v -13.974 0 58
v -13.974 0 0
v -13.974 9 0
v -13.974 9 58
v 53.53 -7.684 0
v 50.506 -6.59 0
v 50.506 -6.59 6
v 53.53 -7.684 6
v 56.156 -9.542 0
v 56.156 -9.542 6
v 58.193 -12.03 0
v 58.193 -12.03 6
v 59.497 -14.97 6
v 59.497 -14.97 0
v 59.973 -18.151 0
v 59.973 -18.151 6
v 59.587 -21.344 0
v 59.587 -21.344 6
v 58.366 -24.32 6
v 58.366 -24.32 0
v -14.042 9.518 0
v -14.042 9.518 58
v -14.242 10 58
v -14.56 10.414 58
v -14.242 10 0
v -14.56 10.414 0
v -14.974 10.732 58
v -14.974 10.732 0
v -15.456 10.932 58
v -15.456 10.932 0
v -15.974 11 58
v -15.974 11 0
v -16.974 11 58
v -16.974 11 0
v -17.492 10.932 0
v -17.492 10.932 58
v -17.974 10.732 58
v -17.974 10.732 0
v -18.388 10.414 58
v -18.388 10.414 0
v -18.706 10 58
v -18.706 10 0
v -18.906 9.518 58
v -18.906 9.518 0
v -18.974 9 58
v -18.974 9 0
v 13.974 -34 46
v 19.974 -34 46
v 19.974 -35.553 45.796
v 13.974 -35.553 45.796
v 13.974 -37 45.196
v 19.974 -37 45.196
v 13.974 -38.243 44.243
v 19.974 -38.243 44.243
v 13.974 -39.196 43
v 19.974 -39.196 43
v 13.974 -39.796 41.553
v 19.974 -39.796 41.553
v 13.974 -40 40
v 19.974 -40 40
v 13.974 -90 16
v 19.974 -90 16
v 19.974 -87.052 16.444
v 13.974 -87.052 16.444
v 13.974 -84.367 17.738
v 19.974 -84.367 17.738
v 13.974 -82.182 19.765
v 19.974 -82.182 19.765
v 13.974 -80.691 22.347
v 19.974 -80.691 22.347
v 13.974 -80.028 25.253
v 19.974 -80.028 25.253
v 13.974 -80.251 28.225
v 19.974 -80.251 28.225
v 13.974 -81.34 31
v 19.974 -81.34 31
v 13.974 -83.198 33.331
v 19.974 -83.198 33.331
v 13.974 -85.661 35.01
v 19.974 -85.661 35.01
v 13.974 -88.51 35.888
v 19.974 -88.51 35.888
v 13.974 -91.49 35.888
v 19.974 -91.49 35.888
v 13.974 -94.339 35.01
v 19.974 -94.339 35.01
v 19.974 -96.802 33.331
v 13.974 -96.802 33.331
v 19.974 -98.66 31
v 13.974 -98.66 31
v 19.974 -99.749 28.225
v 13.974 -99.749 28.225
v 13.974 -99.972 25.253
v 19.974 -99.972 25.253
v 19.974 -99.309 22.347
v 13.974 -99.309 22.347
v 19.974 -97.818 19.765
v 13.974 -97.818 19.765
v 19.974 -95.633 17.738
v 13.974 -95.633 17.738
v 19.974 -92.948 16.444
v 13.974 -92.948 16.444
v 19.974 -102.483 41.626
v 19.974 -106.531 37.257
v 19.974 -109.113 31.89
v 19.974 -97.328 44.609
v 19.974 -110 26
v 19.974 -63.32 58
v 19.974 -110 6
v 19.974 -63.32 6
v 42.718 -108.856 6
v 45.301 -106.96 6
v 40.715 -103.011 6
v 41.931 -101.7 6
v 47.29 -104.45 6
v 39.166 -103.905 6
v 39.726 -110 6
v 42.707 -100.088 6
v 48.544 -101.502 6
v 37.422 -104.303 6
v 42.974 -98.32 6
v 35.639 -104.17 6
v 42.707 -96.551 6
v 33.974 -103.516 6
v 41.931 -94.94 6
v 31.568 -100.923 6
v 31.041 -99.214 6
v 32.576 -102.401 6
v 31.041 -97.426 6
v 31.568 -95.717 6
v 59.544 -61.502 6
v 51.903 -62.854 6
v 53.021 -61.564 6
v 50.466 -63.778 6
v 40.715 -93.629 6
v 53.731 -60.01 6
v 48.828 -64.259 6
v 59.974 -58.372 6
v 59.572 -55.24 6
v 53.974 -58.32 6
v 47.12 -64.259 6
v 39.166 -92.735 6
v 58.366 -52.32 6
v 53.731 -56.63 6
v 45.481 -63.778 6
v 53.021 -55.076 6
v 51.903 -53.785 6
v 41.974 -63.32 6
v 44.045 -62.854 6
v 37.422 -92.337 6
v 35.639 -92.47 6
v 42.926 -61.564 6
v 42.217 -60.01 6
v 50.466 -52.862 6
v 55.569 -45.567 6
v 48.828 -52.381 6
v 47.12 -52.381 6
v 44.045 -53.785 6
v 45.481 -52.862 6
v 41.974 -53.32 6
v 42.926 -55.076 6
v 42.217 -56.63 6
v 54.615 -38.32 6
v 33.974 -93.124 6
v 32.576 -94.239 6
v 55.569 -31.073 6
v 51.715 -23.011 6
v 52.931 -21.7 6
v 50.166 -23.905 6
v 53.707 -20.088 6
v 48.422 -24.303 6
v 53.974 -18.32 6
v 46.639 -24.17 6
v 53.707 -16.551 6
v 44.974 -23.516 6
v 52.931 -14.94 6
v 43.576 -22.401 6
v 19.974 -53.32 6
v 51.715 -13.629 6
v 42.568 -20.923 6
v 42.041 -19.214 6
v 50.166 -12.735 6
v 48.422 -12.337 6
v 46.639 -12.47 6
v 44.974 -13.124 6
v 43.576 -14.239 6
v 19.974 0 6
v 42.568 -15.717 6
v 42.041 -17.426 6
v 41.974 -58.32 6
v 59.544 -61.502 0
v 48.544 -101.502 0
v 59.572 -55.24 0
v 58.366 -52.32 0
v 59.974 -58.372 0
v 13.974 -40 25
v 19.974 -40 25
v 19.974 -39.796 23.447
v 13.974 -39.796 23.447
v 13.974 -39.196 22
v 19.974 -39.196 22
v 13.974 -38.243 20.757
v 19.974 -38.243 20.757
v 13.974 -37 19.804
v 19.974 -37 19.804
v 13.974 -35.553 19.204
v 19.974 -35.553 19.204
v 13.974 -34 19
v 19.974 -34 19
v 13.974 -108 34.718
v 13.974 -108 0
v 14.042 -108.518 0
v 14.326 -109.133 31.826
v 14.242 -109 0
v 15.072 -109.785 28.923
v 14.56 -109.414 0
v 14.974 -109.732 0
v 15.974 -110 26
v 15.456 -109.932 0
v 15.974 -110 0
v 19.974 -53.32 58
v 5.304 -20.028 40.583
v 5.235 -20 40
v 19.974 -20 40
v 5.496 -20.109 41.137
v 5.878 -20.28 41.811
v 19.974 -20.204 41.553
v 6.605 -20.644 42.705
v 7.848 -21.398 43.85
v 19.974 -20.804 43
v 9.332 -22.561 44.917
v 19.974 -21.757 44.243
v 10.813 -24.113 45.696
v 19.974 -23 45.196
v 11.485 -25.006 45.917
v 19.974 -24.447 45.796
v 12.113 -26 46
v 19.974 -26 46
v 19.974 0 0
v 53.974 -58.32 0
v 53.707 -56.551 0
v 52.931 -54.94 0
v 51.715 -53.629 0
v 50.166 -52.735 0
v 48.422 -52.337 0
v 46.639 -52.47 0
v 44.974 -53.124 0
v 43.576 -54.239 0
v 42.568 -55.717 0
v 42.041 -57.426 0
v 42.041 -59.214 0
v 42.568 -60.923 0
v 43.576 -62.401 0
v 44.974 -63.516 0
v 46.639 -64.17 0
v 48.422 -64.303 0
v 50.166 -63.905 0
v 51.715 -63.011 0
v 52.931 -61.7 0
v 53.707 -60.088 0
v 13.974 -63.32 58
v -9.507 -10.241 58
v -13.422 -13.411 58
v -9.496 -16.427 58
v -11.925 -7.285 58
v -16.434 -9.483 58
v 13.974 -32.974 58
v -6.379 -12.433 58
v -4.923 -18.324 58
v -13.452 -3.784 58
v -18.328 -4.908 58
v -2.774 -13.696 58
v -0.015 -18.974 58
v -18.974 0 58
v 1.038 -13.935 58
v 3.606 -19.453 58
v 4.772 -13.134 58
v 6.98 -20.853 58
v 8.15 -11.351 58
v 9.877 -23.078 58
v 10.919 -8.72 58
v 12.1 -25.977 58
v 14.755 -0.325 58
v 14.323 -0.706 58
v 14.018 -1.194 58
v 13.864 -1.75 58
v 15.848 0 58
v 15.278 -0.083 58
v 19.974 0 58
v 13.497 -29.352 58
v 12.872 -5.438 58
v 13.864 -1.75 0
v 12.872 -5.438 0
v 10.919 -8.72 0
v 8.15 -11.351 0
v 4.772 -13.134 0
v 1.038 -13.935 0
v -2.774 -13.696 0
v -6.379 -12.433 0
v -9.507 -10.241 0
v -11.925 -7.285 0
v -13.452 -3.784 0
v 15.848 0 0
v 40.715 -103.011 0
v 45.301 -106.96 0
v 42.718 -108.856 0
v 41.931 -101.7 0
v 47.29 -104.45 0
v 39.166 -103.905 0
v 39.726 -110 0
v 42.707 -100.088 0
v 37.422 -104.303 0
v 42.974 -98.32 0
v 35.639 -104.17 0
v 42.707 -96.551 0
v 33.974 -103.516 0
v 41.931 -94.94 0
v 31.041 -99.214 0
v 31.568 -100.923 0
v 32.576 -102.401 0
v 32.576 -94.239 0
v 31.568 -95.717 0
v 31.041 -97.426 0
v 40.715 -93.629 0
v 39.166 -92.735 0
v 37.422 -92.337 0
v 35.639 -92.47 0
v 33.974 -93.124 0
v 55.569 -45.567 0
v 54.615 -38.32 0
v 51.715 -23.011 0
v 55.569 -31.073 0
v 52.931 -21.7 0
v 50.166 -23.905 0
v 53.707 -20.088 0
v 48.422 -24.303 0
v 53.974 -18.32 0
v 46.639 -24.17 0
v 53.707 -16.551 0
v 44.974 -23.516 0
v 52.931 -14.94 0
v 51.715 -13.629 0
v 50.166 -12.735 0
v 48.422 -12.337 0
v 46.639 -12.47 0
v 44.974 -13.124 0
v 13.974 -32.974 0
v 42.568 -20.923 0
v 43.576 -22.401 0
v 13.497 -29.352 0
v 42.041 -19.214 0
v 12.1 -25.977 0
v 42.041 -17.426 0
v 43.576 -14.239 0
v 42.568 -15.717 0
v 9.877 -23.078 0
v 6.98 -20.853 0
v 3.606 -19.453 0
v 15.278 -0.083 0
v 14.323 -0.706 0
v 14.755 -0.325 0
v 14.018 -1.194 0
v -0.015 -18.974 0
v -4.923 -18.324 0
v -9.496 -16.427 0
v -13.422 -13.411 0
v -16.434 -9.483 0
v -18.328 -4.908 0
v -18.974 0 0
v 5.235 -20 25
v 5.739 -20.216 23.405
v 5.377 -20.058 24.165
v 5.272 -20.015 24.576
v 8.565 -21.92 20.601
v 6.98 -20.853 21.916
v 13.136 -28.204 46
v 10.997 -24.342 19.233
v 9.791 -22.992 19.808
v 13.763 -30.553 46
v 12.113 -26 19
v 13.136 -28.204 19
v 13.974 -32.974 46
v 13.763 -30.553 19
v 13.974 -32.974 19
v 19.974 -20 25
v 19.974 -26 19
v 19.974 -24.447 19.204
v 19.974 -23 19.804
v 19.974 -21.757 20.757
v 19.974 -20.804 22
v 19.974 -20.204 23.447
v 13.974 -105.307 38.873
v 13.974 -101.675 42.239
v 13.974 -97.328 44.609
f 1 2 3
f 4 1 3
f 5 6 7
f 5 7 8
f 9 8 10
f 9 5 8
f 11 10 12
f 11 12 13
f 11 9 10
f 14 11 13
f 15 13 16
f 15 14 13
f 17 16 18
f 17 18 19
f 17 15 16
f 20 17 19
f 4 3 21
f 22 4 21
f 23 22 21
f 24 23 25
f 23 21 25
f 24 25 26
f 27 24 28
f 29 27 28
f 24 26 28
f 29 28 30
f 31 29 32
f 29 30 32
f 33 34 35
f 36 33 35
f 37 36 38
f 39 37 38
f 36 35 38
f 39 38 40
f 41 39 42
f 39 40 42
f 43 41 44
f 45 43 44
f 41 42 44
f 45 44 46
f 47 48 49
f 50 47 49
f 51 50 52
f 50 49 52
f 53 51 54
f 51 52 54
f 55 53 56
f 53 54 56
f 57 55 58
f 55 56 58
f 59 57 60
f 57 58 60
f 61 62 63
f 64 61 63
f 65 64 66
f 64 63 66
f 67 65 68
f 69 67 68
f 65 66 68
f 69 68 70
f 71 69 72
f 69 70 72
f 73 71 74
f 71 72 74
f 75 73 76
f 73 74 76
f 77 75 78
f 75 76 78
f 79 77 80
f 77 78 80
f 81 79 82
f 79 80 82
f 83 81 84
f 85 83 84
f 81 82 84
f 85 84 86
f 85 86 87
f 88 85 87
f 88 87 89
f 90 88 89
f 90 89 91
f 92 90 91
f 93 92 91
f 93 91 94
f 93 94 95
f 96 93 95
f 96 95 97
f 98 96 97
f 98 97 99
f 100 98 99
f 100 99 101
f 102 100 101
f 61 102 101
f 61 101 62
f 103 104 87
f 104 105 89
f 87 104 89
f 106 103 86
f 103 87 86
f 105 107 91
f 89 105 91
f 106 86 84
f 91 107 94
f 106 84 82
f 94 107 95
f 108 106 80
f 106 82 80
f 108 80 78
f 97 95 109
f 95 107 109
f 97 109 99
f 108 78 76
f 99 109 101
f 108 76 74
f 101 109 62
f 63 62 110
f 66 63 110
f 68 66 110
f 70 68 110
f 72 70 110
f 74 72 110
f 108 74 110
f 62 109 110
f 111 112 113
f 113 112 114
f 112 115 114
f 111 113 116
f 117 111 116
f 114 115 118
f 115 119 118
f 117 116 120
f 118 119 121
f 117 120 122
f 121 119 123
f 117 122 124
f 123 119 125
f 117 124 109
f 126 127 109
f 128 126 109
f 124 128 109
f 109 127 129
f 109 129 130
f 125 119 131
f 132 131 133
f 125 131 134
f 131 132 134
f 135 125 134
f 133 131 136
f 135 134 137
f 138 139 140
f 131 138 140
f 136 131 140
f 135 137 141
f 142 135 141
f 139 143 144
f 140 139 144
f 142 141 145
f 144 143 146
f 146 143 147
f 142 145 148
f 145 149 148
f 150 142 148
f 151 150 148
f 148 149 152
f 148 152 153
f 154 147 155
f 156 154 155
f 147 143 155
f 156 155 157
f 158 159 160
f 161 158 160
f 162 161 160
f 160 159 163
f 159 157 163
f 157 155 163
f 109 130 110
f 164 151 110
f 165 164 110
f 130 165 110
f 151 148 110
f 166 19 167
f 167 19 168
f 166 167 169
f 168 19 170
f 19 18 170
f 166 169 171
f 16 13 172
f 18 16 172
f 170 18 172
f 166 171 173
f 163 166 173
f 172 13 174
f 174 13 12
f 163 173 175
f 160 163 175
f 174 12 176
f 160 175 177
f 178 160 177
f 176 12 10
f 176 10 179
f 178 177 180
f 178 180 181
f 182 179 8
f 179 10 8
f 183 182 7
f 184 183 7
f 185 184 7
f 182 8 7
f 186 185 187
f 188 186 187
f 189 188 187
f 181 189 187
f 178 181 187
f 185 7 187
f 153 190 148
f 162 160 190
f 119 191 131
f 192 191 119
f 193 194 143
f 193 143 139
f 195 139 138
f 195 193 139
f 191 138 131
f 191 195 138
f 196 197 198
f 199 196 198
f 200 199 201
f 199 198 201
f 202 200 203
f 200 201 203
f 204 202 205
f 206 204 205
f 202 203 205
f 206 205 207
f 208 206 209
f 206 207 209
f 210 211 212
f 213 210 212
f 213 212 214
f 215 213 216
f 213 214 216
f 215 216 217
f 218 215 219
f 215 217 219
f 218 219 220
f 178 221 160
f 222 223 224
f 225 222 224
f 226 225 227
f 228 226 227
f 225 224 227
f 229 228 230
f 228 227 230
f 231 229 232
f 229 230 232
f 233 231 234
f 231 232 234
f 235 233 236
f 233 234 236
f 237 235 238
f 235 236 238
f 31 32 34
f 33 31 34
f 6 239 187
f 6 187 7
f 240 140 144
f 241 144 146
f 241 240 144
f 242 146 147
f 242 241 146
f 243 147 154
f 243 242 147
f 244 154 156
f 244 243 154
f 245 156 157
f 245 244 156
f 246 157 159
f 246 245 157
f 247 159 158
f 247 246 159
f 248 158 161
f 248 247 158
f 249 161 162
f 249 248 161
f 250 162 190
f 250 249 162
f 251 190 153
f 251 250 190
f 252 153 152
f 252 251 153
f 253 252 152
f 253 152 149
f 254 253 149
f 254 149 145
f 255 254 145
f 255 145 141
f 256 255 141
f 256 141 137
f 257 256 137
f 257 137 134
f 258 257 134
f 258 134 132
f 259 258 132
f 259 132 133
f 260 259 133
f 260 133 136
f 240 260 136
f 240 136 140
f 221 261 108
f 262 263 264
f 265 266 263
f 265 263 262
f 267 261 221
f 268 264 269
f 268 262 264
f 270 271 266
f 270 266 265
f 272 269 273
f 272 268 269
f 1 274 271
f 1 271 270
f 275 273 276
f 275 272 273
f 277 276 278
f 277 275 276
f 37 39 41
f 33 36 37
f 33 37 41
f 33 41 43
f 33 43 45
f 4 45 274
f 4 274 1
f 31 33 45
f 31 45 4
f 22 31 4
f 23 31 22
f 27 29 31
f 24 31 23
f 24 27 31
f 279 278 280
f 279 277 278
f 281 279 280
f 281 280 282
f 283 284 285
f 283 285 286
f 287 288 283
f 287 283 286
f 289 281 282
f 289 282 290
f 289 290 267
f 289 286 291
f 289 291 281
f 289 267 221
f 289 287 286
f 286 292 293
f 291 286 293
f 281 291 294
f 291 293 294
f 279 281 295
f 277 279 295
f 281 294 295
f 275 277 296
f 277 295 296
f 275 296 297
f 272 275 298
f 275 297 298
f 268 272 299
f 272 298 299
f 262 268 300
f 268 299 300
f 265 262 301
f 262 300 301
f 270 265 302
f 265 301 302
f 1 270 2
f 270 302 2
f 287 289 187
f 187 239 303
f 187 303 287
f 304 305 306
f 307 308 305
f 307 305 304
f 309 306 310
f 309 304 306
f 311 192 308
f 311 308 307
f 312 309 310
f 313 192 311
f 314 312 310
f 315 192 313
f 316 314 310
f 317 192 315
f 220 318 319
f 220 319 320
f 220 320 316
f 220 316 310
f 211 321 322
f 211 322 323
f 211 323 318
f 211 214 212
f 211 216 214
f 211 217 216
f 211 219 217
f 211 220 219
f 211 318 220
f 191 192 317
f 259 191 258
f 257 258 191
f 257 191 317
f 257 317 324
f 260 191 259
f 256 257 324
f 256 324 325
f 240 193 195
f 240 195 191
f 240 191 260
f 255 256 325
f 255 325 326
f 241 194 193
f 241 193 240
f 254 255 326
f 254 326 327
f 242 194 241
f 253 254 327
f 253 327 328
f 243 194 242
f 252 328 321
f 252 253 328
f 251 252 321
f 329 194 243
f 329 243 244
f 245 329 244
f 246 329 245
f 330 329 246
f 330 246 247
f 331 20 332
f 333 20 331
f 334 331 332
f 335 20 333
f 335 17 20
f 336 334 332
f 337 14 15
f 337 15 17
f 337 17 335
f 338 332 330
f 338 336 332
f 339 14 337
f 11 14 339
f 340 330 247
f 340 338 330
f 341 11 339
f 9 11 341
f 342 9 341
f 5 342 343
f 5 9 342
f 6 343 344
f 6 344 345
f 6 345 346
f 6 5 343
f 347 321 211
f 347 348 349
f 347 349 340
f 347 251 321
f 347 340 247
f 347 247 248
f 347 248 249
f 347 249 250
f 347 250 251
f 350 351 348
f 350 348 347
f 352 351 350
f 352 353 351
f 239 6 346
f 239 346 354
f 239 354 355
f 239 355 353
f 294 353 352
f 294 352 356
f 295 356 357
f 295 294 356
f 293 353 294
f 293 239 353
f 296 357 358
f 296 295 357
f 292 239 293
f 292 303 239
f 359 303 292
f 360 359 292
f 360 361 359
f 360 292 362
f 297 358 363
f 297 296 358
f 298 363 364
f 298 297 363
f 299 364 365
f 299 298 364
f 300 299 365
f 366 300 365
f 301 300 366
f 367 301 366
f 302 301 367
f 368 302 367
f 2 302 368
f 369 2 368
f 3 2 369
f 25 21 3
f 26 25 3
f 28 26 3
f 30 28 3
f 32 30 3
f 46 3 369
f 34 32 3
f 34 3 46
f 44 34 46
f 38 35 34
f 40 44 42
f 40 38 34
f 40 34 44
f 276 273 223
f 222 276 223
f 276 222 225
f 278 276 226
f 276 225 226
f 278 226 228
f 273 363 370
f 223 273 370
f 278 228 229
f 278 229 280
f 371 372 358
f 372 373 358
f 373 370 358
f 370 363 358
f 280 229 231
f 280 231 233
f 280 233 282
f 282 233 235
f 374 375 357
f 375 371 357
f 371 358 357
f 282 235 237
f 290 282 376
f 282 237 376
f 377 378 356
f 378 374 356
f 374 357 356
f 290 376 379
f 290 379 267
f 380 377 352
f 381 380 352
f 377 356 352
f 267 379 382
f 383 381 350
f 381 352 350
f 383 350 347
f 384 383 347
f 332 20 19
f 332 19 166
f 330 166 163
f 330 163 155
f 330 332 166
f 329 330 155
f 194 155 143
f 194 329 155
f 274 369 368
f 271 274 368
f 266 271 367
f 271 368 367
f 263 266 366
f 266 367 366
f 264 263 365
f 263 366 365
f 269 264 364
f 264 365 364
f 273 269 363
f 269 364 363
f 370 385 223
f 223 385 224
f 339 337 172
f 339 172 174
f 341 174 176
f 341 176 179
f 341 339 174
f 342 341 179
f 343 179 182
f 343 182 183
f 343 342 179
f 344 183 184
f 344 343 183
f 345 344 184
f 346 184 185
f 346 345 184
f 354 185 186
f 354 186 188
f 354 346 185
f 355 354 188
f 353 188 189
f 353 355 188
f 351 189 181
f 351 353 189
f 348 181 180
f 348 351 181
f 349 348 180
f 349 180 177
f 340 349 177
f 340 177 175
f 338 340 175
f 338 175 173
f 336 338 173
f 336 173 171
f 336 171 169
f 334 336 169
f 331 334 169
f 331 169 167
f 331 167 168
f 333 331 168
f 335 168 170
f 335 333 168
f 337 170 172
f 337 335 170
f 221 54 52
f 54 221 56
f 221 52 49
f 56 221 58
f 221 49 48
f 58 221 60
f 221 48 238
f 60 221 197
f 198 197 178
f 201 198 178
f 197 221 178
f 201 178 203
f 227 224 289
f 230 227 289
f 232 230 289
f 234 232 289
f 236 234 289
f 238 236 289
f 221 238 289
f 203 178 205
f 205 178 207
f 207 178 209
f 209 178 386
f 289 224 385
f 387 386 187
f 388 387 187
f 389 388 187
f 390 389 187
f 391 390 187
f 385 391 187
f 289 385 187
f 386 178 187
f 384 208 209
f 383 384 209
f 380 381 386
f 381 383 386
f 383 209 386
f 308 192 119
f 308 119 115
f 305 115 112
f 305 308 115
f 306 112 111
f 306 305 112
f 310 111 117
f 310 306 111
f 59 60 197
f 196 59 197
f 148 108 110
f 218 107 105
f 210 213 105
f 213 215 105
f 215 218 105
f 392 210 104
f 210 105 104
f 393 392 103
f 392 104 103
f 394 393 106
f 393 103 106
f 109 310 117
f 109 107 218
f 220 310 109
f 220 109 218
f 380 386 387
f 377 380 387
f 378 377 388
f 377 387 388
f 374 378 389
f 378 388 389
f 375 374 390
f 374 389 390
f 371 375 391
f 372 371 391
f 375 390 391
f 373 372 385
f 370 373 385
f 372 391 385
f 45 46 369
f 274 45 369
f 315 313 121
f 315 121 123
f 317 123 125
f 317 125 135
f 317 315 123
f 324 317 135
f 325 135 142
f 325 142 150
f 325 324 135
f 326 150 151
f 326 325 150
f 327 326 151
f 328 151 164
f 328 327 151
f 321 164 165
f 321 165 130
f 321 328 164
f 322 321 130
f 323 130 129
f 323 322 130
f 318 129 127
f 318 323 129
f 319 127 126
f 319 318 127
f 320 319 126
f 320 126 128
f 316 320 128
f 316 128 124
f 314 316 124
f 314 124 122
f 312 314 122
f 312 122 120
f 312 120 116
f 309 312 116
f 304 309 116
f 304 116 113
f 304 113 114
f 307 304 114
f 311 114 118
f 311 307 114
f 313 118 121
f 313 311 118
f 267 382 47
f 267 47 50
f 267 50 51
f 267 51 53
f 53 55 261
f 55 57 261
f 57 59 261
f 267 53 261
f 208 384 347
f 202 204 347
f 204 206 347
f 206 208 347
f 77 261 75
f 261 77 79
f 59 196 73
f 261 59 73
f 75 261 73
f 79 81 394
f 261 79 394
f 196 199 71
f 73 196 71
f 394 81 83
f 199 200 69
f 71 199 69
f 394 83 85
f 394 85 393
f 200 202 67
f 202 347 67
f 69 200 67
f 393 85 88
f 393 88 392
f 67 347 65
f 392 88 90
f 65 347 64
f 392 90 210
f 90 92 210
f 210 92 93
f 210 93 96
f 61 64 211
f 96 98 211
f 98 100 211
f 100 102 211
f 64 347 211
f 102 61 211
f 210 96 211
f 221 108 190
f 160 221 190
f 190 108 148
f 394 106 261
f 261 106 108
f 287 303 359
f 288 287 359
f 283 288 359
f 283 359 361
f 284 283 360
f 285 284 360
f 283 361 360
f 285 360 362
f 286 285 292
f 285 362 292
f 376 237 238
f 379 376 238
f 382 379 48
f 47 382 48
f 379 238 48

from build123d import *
from OCP.BRepAlgoAPI import BRepAlgoAPI_Cut
from OCP.TopTools import TopTools_ListOfShape

# Parameters (mm, degrees)
BOSS_EXTRUDE1_DEPTH = 58
SKETCH1_4_R         = 6
BOSS_EXTRUDE3_DEPTH = 6
CUT_EXTRUDE8_DEPTH  = 26
RIB14_REACH         = 110.472
SKETCH8_WALL_W      = 275.405915094
SKETCH8_WALL_H      = 10
SKETCH10_R          = 10
CUT_EXTRUDE10_DEPTH = 21


with BuildPart() as part:
    # Sketch1 → Boss-Extrude1 (new body)
    with BuildSketch(Plane.XY):
        with BuildLine():
            Line((-18.973896199, 9), (-18.973896199, 0))
            ThreePointArc((-18.973896199, 0), (-13.421880234, -13.411258999), (-0.015020694, -18.973890253))
            ThreePointArc((-0.015020694, -18.973890253), (9.87730883, -23.078310175), (13.973896199, -32.973885866))
            Line((13.973896199, -32.973885866), (13.973896199, -108))
            ThreePointArc((13.973896199, -108), (14.559682636, -109.414213562), (15.973896199, -110))
            Line((15.973896199, -110), (19.973896199, -110))
            Line((19.973896199, -110), (19.973896199, 0))
            Line((19.973896199, 0), (15.848197366, 0))
            ThreePointArc((15.848197366, 0), (14.525476133, -0.499863827), (13.863935397, -1.749591462))
            ThreePointArc((13.863935397, -1.749591462), (-0.876521771, -13.946378905), (-13.973896199, 0))
            Line((-13.973896199, 0), (-13.973896199, 9))
            ThreePointArc((-13.973896199, 9), (-14.559682636, 10.414213562), (-15.973896199, 11))
            Line((-15.973896199, 11), (-16.973896199, 11))
            ThreePointArc((-16.973896199, 11), (-18.388109761, 10.414213562), (-18.973896199, 9))
        make_face()
    extrude(amount=BOSS_EXTRUDE1_DEPTH)

    # Sketch1<4> → Boss-Extrude3 (add)
    with BuildSketch(Plane.XY):
        with BuildLine():
            Line((19.973896199, 0), (19.973896199, -110))
            Line((19.973896199, -110), (39.726458462, -110))
            ThreePointArc((39.726458462, -110), (45.301079262, -106.960444534), (48.544360912, -101.501834946))
            Line((48.544360912, -101.501834946), (59.544360912, -61.501834946))
            ThreePointArc((59.544360912, -61.501834946), (59.876313249, -56.792715074), (58.366201044, -52.31995715))
            ThreePointArc((58.366201044, -52.31995715), (54.61491235, -38.31995715), (58.366201044, -24.31995715))
            ThreePointArc((58.366201044, -24.31995715), (58.944097052, -13.456348075), (50.505709466, -6.590084108))
            Line((50.505709466, -6.590084108), (19.973896199, 0))
        make_face()
        with Locations((36.973896199, -98.31995715)):
            Circle(SKETCH1_4_R, mode=Mode.SUBTRACT)
        with Locations((47.973896199, -58.31995715)):
            Circle(SKETCH1_4_R, mode=Mode.SUBTRACT)
        with Locations((47.973896199, -18.31995715)):
            Circle(SKETCH1_4_R, mode=Mode.SUBTRACT)
    extrude(amount=BOSS_EXTRUDE3_DEPTH)

    # Sketch6 → Cut-Extrude8 (cut)
    with BuildSketch(Plane(origin=(19.973896199, 0, 0), x_dir=(0, 0, -1), z_dir=(1, 0, 0))):
        with BuildLine():
            Line((-40, -40), (-25, -40))
            ThreePointArc((-25, -40), (-20.757359313, -38.242640687), (-19, -34))
            Line((-19, -34), (-19, -26))
            ThreePointArc((-19, -26), (-20.757359313, -21.757359313), (-25, -20))
            Line((-25, -20), (-40, -20))
            ThreePointArc((-40, -20), (-44.242640687, -21.757359313), (-46, -26))
            Line((-46, -26), (-46, -34))
            ThreePointArc((-46, -34), (-44.242640687, -38.242640687), (-40, -40))
        make_face()
    extrude(amount=-CUT_EXTRUDE8_DEPTH, mode=Mode.SUBTRACT)

    # Sketch8 wall → Rib14 (add, up to next)
    with BuildSketch(Plane(origin=(30.973896199, -58.31995715, 32), x_dir=(0.389639990837, 0, -0.920967251069), z_dir=(-0.920967251069, 0, -0.389639990837)), mode=Mode.PRIVATE) as rib14_sk1:
        Rectangle(SKETCH8_WALL_W, SKETCH8_WALL_H)
    rib14_tool1 = extrude(rib14_sk1.sketch, amount=RIB14_REACH, mode=Mode.PRIVATE) - part.part
    add(rib14_tool1.solids().sort_by_distance((30.973896199, -58.31995715, 32))[0])


with BuildPart() as cut_extrude10_tool:
    # Sketch10 → Cut-Extrude10 (new body)
    with BuildSketch(Plane(origin=(19.973896199, 0, 0), x_dir=(0, 0, -1), z_dir=(1, 0, 0))):
        with BuildLine():
            ThreePointArc((-26.000000311, -110), (-37.257208214, -106.531039387), (-44.609335124, -97.327526611))
            Line((-44.609335124, -97.327526611), (-58, -63.31995715))
            Line((-58, -63.31995715), (-58, -110))
            Line((-58, -110), (-26.000000311, -110))
        make_face()
        with Locations((-26, -90)):
            Circle(SKETCH10_R)
    extrude(amount=-CUT_EXTRUDE10_DEPTH)


with BuildPart() as part_1:
    add(part.part)

    # Cut-Extrude10: cut by cut_extrude10_tool, with a tolerance
    cut_extrude10_stock = TopTools_ListOfShape()
    cut_extrude10_stock.Append(part_1.part.wrapped)
    cut_extrude10_tools = TopTools_ListOfShape()
    cut_extrude10_tools.Append(cut_extrude10_tool.part.wrapped)
    cut_extrude10_cut = BRepAlgoAPI_Cut()
    cut_extrude10_cut.SetArguments(cut_extrude10_stock)
    cut_extrude10_cut.SetTools(cut_extrude10_tools)
    cut_extrude10_cut.SetFuzzyValue(0.00001)
    cut_extrude10_cut.Build()
    add(Compound.cast(cut_extrude10_cut.Shape()).solids(), mode=Mode.REPLACE)


solid = part_1.part
